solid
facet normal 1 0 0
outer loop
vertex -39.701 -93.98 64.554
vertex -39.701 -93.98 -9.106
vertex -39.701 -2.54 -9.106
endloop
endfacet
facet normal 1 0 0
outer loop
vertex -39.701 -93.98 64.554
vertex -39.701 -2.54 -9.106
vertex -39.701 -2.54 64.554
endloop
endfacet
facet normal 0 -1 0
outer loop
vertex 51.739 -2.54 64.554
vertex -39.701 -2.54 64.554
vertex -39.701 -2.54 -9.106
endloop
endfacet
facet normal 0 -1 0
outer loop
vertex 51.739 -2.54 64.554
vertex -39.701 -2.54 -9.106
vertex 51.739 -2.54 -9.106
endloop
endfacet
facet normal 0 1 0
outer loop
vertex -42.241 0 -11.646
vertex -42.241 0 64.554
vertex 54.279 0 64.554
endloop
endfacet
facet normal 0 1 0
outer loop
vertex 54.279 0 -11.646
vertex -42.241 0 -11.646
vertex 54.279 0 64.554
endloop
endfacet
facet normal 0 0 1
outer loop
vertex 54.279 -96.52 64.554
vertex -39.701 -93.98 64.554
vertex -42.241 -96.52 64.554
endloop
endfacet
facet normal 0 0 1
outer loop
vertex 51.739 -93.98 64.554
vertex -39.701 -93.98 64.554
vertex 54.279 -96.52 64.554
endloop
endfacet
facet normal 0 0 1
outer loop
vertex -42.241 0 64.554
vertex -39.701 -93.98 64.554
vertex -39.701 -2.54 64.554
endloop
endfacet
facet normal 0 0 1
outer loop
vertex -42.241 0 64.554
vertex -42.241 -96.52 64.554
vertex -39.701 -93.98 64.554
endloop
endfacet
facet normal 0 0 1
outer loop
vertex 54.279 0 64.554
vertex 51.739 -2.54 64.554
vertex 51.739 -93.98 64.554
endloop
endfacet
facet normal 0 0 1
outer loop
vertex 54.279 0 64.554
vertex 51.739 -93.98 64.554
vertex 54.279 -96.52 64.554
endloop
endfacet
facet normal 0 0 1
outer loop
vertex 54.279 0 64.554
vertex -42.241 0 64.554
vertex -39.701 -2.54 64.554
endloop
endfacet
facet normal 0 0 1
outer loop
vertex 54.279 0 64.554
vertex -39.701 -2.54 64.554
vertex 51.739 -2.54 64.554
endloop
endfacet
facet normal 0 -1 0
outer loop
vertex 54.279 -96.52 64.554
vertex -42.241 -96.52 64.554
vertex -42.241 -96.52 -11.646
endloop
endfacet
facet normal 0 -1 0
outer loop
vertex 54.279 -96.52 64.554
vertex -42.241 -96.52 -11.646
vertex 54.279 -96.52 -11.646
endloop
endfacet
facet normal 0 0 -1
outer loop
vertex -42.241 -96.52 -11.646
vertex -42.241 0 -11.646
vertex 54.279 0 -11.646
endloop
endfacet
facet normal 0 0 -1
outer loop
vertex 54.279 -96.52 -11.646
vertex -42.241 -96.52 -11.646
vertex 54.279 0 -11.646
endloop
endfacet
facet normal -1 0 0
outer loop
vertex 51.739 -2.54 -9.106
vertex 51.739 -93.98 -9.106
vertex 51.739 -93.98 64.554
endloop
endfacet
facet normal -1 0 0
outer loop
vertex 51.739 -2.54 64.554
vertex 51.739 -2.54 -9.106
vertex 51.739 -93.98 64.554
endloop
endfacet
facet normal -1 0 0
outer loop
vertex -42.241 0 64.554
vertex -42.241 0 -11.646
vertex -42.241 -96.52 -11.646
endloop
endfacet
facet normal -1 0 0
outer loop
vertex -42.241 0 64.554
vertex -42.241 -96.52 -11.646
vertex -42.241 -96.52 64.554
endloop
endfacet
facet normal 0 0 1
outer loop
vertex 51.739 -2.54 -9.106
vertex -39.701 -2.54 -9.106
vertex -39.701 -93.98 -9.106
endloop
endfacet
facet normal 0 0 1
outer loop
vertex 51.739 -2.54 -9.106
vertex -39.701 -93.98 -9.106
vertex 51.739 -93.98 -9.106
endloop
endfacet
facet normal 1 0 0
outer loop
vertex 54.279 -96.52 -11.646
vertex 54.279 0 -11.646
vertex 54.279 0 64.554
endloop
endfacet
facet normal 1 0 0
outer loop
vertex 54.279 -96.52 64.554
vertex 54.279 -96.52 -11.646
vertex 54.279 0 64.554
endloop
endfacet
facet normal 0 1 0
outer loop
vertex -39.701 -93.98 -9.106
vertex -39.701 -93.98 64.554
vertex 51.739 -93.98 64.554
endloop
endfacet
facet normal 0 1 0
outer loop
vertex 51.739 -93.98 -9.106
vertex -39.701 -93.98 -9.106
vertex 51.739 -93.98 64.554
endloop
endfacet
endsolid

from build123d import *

# Parameters (mm, degrees)
F0_W     = 96.52
F0_H     = 76.2
F1_DEPTH = 96.52
F2_T     = -2.54


with BuildPart() as f1:
    # F0 (on Front) → F1 (new body)
    with BuildSketch(Plane.XZ):
        with Locations((6.01927, 26.454038)):
            Rectangle(F0_W, F0_H)
    extrude(amount=F1_DEPTH)

    # F2
    f2_openings = [f1.faces().sort_by_distance(p)[0] for p in [
        (6.01927, -48.26, 64.554038),
    ]]
    offset(amount=F2_T, openings=f2_openings)


solid = f1.part
